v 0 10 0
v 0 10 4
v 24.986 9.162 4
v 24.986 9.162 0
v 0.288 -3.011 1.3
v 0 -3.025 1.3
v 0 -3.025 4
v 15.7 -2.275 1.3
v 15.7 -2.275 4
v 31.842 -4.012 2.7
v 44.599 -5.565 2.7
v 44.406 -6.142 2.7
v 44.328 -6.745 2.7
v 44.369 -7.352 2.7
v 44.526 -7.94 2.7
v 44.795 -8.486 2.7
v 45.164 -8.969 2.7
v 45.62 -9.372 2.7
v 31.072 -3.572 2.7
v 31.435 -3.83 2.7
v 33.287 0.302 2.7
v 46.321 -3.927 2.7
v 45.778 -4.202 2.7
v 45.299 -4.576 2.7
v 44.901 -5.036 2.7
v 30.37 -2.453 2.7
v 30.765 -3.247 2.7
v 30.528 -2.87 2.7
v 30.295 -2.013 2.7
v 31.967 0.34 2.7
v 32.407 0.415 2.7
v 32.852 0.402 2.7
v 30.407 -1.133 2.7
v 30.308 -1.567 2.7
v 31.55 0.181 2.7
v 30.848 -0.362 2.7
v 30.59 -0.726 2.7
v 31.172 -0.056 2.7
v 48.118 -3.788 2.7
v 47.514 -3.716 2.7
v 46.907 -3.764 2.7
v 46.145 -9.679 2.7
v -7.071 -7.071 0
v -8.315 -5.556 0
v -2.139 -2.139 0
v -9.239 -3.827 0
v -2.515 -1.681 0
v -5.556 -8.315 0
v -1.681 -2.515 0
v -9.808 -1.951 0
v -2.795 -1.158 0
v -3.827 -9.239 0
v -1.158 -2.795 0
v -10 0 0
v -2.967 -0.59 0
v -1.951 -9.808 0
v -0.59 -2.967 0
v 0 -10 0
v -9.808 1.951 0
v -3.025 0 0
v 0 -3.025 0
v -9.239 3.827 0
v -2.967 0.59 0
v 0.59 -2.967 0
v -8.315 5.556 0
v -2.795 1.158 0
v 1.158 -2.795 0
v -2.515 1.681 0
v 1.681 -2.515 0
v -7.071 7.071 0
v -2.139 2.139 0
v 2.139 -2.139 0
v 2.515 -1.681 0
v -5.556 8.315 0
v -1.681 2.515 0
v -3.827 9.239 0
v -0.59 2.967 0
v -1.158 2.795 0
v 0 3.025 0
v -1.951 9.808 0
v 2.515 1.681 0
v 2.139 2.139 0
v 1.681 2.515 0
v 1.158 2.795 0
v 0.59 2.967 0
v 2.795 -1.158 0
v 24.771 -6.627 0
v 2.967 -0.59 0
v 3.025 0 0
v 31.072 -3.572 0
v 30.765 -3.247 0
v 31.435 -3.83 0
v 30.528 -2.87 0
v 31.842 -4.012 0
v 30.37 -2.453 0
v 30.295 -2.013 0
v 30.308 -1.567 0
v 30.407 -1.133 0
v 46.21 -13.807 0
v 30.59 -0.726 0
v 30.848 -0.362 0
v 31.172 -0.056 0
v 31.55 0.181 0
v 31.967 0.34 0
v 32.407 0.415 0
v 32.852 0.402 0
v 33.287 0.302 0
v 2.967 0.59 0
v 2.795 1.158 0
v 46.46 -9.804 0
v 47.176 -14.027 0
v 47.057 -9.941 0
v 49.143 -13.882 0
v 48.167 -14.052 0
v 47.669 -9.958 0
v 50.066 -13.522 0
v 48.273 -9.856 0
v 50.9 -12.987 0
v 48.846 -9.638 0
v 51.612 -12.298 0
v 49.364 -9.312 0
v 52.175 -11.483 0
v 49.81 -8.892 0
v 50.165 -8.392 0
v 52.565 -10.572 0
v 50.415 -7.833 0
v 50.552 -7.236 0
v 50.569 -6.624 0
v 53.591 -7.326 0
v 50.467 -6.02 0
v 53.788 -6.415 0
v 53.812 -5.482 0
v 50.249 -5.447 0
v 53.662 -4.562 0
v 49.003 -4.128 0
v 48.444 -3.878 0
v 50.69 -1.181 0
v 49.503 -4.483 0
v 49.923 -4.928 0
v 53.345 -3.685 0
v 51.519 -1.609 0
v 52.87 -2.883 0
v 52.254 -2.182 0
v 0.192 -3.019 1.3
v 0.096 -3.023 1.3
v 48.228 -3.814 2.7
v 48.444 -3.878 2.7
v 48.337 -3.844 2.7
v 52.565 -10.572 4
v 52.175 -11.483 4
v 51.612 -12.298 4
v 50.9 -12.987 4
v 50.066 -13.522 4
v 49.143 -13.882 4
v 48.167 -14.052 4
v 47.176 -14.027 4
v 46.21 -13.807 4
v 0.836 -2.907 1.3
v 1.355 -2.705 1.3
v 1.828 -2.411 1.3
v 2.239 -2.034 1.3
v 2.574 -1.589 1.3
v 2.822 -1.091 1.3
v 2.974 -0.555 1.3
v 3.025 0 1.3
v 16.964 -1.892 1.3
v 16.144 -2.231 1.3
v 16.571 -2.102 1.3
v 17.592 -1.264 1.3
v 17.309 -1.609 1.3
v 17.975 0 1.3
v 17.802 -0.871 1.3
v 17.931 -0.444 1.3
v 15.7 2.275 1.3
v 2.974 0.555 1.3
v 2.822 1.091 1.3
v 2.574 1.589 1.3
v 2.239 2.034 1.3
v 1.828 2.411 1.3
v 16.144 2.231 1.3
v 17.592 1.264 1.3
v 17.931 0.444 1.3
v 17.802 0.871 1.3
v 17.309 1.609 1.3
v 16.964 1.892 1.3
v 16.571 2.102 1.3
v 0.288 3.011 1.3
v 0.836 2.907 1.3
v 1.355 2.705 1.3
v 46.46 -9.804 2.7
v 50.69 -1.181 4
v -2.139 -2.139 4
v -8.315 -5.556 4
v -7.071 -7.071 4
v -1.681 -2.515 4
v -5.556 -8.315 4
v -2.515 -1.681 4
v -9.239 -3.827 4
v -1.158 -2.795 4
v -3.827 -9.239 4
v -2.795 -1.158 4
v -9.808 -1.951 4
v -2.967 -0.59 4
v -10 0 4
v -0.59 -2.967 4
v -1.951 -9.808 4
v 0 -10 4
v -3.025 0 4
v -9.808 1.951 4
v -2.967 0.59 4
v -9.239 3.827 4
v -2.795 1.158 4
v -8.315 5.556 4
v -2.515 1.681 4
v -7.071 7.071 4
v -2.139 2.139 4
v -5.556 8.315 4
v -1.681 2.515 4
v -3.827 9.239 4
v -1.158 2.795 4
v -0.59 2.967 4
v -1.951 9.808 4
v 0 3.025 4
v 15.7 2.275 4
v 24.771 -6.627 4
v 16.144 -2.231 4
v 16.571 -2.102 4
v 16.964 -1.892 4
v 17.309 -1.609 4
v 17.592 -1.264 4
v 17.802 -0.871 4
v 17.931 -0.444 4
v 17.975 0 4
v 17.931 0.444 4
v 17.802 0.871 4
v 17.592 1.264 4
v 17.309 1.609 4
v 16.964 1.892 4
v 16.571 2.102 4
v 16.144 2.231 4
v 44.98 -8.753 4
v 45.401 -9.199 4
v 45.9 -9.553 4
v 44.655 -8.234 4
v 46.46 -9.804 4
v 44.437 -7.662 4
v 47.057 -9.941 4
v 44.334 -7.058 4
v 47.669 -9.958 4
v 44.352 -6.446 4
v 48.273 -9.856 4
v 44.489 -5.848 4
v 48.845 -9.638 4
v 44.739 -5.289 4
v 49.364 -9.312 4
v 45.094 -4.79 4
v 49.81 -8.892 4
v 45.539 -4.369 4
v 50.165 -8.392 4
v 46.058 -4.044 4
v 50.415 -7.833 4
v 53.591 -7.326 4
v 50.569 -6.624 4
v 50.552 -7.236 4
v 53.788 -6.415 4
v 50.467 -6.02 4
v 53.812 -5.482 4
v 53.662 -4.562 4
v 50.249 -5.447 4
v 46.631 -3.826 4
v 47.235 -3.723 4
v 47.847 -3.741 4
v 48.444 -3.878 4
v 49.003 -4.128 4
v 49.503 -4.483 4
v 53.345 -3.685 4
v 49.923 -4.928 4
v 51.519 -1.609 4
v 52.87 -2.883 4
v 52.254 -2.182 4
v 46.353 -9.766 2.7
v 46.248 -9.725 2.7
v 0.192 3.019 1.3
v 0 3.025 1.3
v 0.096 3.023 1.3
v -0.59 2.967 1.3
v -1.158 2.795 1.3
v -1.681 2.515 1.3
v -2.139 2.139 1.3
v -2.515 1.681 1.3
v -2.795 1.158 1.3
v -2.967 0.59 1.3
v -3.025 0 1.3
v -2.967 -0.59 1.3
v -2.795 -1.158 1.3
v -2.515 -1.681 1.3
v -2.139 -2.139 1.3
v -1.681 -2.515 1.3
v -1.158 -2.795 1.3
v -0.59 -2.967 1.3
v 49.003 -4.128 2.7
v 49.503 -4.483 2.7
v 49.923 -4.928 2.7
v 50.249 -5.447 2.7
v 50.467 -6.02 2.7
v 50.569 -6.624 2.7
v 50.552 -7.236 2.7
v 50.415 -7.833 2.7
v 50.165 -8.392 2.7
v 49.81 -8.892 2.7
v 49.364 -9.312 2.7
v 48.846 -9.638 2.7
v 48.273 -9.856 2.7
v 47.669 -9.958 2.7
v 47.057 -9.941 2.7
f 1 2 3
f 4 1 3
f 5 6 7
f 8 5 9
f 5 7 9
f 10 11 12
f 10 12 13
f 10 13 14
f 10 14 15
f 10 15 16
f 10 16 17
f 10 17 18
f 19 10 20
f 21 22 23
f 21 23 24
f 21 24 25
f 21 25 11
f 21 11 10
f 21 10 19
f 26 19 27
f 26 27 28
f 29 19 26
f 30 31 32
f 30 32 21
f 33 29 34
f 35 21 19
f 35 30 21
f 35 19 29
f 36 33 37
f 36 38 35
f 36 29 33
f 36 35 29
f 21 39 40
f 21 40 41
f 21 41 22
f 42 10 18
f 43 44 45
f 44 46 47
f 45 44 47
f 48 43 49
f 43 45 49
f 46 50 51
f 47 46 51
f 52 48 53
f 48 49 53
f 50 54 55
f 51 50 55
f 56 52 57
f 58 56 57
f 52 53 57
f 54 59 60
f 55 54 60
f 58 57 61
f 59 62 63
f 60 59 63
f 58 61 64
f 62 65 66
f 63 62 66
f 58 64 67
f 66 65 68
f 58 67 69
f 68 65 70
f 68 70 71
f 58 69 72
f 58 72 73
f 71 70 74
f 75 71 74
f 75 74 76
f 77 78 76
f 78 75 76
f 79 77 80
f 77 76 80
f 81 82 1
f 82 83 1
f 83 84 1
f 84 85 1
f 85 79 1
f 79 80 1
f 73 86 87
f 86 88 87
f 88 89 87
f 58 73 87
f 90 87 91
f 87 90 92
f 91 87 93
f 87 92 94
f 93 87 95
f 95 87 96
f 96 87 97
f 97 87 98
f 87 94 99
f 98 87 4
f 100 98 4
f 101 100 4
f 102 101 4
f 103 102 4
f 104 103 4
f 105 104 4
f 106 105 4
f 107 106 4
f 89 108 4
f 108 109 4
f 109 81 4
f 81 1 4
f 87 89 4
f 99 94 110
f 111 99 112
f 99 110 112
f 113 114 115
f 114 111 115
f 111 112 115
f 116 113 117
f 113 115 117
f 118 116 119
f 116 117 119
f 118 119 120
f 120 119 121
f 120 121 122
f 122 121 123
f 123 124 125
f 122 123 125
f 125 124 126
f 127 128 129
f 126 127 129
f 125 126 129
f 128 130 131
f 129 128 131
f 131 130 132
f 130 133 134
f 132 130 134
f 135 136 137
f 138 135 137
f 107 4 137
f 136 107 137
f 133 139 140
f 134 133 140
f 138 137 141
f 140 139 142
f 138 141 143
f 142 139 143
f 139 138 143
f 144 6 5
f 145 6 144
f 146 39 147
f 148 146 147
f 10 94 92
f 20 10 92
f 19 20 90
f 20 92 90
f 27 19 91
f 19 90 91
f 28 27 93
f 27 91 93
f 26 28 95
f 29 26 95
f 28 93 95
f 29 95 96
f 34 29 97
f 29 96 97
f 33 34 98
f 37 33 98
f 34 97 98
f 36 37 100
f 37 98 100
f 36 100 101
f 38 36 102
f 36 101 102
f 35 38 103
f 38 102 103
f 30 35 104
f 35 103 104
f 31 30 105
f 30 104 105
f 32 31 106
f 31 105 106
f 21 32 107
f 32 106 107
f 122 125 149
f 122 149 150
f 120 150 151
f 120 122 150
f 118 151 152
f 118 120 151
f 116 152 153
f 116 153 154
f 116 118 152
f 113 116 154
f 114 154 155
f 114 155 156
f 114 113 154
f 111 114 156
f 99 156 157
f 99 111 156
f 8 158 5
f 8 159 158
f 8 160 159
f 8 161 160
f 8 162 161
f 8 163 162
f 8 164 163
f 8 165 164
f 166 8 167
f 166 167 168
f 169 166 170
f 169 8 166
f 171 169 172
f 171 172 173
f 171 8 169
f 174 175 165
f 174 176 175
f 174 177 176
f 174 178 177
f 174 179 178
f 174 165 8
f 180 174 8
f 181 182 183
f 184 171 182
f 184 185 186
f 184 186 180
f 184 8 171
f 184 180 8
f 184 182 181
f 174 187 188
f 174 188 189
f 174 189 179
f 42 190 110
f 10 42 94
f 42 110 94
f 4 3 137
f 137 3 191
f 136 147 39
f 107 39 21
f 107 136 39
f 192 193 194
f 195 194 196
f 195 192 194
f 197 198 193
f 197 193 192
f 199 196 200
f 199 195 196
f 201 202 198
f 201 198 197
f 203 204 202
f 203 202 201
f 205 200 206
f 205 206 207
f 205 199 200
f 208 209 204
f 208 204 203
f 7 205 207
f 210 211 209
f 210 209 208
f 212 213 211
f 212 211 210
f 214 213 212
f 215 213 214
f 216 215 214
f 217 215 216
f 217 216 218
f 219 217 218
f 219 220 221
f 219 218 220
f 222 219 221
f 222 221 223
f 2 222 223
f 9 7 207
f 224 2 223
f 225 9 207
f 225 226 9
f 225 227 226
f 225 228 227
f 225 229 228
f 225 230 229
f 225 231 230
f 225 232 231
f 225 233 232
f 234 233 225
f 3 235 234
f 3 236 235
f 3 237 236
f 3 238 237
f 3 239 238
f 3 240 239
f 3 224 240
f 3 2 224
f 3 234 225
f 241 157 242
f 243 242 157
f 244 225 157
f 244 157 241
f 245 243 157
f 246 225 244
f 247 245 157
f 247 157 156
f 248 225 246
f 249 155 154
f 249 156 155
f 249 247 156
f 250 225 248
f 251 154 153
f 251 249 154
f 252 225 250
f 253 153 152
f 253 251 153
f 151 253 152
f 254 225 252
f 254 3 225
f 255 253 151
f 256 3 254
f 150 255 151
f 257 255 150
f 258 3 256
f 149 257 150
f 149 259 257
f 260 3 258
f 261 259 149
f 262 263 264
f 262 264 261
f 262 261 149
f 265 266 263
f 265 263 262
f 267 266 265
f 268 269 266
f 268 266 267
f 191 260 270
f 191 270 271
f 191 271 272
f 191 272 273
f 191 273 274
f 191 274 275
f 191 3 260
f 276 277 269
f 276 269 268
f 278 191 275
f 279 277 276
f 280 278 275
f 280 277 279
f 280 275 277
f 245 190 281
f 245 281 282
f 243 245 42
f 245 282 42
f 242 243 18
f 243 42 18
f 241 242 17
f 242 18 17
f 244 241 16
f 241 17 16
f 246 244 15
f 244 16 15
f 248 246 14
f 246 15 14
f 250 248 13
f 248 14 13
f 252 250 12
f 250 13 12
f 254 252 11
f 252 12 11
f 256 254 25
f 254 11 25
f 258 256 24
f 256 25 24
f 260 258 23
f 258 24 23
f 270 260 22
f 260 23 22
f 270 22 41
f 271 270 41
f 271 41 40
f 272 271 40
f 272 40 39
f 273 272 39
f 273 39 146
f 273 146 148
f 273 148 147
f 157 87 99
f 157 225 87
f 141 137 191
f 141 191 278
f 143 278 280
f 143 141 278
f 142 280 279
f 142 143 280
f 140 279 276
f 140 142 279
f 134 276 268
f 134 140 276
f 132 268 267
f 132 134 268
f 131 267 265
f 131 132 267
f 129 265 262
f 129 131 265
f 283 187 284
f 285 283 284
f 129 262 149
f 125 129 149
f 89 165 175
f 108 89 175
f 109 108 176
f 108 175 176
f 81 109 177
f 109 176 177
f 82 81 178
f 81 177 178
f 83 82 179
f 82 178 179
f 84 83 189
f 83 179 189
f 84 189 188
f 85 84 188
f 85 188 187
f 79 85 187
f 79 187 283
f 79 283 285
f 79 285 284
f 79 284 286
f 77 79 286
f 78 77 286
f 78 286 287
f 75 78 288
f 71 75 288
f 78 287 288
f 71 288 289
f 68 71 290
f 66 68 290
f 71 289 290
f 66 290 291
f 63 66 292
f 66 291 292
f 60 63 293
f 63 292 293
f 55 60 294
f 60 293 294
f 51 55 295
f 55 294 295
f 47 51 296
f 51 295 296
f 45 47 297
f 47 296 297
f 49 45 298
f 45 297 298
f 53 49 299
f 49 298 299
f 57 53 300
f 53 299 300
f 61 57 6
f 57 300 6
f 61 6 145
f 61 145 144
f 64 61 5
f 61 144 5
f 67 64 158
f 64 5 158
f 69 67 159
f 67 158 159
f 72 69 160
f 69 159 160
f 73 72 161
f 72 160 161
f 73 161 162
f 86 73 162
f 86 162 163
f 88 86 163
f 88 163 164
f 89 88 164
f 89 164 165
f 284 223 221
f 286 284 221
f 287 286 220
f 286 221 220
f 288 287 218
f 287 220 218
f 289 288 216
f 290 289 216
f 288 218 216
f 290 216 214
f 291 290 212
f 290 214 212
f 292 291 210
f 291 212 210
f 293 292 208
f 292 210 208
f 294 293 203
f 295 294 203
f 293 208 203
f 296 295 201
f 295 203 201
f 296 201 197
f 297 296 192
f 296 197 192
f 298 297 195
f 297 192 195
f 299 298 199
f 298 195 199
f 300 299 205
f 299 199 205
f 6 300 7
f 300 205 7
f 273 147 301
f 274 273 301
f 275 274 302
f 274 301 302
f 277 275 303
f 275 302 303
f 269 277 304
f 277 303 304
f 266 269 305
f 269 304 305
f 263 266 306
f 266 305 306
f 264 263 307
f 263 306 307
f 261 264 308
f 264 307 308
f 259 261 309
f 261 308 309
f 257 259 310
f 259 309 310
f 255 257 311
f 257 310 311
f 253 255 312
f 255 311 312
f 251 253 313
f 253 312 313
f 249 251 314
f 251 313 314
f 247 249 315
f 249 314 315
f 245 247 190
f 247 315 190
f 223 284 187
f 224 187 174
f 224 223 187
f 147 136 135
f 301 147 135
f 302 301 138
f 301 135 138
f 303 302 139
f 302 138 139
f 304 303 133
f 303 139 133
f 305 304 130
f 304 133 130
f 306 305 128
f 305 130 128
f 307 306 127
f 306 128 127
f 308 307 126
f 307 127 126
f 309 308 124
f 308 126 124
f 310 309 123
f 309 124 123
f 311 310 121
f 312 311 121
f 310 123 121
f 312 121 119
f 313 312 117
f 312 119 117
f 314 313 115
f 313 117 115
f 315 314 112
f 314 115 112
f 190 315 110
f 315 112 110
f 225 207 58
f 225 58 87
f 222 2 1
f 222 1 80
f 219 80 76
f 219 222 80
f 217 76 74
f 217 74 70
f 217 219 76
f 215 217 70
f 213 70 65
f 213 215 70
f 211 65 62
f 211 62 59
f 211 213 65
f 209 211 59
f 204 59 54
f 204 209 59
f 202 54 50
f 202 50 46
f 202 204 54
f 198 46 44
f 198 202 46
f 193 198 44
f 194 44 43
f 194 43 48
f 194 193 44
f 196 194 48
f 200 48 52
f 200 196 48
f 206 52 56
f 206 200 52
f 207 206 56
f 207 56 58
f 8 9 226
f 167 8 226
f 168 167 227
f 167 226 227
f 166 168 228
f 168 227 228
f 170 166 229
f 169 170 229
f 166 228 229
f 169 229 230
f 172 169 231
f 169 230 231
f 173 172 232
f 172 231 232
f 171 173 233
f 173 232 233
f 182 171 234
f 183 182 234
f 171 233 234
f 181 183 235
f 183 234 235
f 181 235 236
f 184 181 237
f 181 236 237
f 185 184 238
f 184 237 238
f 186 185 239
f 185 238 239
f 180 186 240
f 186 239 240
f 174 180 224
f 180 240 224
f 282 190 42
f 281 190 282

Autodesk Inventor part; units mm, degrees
ref_plane "YZ Plane" through (0, 0, 0) normal (1, 0, 0) x (0, 1, 0)
ref_plane "XZ Plane" through (0, 0, 0) normal (0, 1, 0) x (-1, 0, 0)
ref_plane "XY Plane" through (0, 0, 0) normal (0, 0, 1) x (1, 0, 0)
sketch "Sketch1" plane through (0, 0, 0) normal (0, 0, 1) x (1, 0, 0)
  arc A0 (0.2884, 3.0112) -> (0.2884, -3.0112) centre (0, 0) ccw
  arc A1 (15.7, -2.275) -> (15.7, 2.275) centre (15.7, 0) ccw
  line L0 (0, 3.025) -> (15.7, 2.275)
  line L1 (0, -3.025) -> (15.7, -2.275)
  dimension "d0" = 6.05
  dimension "d2" = 15.7
  dimension "d3" = 4.55
extrude "Extrusion1" add sketch "Sketch1" along normal blind 4 contours L0 A1 L1 A0
sketch "Sketch6" plane through (0, 0, 4) normal (0, 0, 1) x (1, 0, 0)
  arc A0 (0.6699, 9.9775) -> (2.6736, -9.636) centre (0, 0) ccw
  line L0 (0, 10) -> (24.986, 9.1622)
  line L1 (0, -10) -> (24.7714, -6.6271)
  line L2 (24.986, 9.1622) -> (54.986, -2.9102)
  line L3 (24.7714, -6.6271) -> (51.0332, -15.4223)
  line L4 (54.986, -2.9102) -> (51.0332, -15.4223)
  line L5 (15.7, 2.275) -> (0, 3.025) projected
  arc A1 (0, 3.025) -> (0, -3.025) centre (0, 0) ccw projected
  line L6 (0, -3.025) -> (15.7, -2.275) projected
  arc A2 (15.7, -2.275) -> (15.7, 2.275) centre (15.7, 0) ccw projected
  dimension "d32" = 20
  dimension "d33" = 25
  dimension "d34" = 25
  dimension "d37" = 160
  dimension "d39" = 30
  dimension "d56" = 51.0332
  dimension "d82" = 9.674
  dimension "d83" = 13.1217
  dimension "d84" = 153.73
extrude "Extrusion5" add sketch "Sketch6" against normal blind 4 contours L0 L2 L4 L3 L1 A0
sketch "Sketch8" plane through (0, 0, 4) normal (0, 0, 1) x (1, 0, 0)
  line L0 (0, -3.025) -> (15.7, -2.275) projected
  arc A0 (0.2884, 3.0112) -> (0.2884, -3.0112) centre (0, 0) ccw projected
  line L1 (0, 3.025) -> (15.7, 2.275) projected
  arc A1 (15.7, -2.275) -> (15.7, 2.275) centre (15.7, 0) ccw projected
extrude "Extrusion8" cut sketch "Sketch8" against normal blind 2.7 contours A0 L1 A1 L0
sketch "Sketch9" plane through (0, 0, 1.3) normal (0, 0, 1) x (1, 0, 0)
  line L0 (15.7, -2.275) -> (0, -3.025) projected
  circle A0 centre (0, 0) radius 3.025
  point P0 (0.2884, -3.0112)
extrude "Extrusion9" cut sketch "Sketch9" against normal through all
sketch "Sketch11" plane through (0, 0, 0) normal (0, 0, -1) x (-1, 0, 0)
  arc A0 (-48.1186, -3.7877) -> (-46.1454, -9.6796) centre (-47.4519, -6.8408) ccw
  arc A1 (-31.8422, -4.0122) -> (-33.2871, 0.3023) centre (-32.5646, -1.855) ccw
  line L0 (-53.146, -8.7478) -> (-23.9305, 1.0366) construction
  line L1 (-48.4443, -3.8776) -> (-33.2871, 0.3023)
  line L2 (-46.4595, -9.804) -> (-31.8422, -4.0122)
  line L3 (-54.986, -2.9102) -> (-51.0332, -15.4223) projected
  line L4 (-51.0332, -15.4223) -> (-24.7714, -6.6271) projected
  point P0 (0, 0)
  dimension "d60" = 6.25
  dimension "d64" = 4.55
  dimension "d65" = 3.125
  dimension "d66" = 2.275
  dimension "d74" = 6
  dimension "d75" = 7
  dimension "d77" = 15.7
fillet "Fillet3" radius 5 2 edges at (54.986, -2.9102, 2) (51.0332, -15.4223, 2)
extrude "Extrusion12" cut sketch "Sketch11" against normal blind 2.7 contours L1 A1 L2 A0
sketch "Sketch14" plane through (0, 0, 2.7) normal (0, 0, -1) x (-1, 0, 0)
  arc A0 (-48.4443, -3.8776) -> (-46.4595, -9.804) centre (-47.4519, -6.8408) ccw projected
  circle A1 centre (-47.4519, -6.8408) radius 3.125
  point P0 (0, 0)
  point P1 (-48.4443, -3.8776)
extrude "Extrusion13" cut sketch "Sketch14" against normal blind 2.7
properties part number "pata_superior_v3"
